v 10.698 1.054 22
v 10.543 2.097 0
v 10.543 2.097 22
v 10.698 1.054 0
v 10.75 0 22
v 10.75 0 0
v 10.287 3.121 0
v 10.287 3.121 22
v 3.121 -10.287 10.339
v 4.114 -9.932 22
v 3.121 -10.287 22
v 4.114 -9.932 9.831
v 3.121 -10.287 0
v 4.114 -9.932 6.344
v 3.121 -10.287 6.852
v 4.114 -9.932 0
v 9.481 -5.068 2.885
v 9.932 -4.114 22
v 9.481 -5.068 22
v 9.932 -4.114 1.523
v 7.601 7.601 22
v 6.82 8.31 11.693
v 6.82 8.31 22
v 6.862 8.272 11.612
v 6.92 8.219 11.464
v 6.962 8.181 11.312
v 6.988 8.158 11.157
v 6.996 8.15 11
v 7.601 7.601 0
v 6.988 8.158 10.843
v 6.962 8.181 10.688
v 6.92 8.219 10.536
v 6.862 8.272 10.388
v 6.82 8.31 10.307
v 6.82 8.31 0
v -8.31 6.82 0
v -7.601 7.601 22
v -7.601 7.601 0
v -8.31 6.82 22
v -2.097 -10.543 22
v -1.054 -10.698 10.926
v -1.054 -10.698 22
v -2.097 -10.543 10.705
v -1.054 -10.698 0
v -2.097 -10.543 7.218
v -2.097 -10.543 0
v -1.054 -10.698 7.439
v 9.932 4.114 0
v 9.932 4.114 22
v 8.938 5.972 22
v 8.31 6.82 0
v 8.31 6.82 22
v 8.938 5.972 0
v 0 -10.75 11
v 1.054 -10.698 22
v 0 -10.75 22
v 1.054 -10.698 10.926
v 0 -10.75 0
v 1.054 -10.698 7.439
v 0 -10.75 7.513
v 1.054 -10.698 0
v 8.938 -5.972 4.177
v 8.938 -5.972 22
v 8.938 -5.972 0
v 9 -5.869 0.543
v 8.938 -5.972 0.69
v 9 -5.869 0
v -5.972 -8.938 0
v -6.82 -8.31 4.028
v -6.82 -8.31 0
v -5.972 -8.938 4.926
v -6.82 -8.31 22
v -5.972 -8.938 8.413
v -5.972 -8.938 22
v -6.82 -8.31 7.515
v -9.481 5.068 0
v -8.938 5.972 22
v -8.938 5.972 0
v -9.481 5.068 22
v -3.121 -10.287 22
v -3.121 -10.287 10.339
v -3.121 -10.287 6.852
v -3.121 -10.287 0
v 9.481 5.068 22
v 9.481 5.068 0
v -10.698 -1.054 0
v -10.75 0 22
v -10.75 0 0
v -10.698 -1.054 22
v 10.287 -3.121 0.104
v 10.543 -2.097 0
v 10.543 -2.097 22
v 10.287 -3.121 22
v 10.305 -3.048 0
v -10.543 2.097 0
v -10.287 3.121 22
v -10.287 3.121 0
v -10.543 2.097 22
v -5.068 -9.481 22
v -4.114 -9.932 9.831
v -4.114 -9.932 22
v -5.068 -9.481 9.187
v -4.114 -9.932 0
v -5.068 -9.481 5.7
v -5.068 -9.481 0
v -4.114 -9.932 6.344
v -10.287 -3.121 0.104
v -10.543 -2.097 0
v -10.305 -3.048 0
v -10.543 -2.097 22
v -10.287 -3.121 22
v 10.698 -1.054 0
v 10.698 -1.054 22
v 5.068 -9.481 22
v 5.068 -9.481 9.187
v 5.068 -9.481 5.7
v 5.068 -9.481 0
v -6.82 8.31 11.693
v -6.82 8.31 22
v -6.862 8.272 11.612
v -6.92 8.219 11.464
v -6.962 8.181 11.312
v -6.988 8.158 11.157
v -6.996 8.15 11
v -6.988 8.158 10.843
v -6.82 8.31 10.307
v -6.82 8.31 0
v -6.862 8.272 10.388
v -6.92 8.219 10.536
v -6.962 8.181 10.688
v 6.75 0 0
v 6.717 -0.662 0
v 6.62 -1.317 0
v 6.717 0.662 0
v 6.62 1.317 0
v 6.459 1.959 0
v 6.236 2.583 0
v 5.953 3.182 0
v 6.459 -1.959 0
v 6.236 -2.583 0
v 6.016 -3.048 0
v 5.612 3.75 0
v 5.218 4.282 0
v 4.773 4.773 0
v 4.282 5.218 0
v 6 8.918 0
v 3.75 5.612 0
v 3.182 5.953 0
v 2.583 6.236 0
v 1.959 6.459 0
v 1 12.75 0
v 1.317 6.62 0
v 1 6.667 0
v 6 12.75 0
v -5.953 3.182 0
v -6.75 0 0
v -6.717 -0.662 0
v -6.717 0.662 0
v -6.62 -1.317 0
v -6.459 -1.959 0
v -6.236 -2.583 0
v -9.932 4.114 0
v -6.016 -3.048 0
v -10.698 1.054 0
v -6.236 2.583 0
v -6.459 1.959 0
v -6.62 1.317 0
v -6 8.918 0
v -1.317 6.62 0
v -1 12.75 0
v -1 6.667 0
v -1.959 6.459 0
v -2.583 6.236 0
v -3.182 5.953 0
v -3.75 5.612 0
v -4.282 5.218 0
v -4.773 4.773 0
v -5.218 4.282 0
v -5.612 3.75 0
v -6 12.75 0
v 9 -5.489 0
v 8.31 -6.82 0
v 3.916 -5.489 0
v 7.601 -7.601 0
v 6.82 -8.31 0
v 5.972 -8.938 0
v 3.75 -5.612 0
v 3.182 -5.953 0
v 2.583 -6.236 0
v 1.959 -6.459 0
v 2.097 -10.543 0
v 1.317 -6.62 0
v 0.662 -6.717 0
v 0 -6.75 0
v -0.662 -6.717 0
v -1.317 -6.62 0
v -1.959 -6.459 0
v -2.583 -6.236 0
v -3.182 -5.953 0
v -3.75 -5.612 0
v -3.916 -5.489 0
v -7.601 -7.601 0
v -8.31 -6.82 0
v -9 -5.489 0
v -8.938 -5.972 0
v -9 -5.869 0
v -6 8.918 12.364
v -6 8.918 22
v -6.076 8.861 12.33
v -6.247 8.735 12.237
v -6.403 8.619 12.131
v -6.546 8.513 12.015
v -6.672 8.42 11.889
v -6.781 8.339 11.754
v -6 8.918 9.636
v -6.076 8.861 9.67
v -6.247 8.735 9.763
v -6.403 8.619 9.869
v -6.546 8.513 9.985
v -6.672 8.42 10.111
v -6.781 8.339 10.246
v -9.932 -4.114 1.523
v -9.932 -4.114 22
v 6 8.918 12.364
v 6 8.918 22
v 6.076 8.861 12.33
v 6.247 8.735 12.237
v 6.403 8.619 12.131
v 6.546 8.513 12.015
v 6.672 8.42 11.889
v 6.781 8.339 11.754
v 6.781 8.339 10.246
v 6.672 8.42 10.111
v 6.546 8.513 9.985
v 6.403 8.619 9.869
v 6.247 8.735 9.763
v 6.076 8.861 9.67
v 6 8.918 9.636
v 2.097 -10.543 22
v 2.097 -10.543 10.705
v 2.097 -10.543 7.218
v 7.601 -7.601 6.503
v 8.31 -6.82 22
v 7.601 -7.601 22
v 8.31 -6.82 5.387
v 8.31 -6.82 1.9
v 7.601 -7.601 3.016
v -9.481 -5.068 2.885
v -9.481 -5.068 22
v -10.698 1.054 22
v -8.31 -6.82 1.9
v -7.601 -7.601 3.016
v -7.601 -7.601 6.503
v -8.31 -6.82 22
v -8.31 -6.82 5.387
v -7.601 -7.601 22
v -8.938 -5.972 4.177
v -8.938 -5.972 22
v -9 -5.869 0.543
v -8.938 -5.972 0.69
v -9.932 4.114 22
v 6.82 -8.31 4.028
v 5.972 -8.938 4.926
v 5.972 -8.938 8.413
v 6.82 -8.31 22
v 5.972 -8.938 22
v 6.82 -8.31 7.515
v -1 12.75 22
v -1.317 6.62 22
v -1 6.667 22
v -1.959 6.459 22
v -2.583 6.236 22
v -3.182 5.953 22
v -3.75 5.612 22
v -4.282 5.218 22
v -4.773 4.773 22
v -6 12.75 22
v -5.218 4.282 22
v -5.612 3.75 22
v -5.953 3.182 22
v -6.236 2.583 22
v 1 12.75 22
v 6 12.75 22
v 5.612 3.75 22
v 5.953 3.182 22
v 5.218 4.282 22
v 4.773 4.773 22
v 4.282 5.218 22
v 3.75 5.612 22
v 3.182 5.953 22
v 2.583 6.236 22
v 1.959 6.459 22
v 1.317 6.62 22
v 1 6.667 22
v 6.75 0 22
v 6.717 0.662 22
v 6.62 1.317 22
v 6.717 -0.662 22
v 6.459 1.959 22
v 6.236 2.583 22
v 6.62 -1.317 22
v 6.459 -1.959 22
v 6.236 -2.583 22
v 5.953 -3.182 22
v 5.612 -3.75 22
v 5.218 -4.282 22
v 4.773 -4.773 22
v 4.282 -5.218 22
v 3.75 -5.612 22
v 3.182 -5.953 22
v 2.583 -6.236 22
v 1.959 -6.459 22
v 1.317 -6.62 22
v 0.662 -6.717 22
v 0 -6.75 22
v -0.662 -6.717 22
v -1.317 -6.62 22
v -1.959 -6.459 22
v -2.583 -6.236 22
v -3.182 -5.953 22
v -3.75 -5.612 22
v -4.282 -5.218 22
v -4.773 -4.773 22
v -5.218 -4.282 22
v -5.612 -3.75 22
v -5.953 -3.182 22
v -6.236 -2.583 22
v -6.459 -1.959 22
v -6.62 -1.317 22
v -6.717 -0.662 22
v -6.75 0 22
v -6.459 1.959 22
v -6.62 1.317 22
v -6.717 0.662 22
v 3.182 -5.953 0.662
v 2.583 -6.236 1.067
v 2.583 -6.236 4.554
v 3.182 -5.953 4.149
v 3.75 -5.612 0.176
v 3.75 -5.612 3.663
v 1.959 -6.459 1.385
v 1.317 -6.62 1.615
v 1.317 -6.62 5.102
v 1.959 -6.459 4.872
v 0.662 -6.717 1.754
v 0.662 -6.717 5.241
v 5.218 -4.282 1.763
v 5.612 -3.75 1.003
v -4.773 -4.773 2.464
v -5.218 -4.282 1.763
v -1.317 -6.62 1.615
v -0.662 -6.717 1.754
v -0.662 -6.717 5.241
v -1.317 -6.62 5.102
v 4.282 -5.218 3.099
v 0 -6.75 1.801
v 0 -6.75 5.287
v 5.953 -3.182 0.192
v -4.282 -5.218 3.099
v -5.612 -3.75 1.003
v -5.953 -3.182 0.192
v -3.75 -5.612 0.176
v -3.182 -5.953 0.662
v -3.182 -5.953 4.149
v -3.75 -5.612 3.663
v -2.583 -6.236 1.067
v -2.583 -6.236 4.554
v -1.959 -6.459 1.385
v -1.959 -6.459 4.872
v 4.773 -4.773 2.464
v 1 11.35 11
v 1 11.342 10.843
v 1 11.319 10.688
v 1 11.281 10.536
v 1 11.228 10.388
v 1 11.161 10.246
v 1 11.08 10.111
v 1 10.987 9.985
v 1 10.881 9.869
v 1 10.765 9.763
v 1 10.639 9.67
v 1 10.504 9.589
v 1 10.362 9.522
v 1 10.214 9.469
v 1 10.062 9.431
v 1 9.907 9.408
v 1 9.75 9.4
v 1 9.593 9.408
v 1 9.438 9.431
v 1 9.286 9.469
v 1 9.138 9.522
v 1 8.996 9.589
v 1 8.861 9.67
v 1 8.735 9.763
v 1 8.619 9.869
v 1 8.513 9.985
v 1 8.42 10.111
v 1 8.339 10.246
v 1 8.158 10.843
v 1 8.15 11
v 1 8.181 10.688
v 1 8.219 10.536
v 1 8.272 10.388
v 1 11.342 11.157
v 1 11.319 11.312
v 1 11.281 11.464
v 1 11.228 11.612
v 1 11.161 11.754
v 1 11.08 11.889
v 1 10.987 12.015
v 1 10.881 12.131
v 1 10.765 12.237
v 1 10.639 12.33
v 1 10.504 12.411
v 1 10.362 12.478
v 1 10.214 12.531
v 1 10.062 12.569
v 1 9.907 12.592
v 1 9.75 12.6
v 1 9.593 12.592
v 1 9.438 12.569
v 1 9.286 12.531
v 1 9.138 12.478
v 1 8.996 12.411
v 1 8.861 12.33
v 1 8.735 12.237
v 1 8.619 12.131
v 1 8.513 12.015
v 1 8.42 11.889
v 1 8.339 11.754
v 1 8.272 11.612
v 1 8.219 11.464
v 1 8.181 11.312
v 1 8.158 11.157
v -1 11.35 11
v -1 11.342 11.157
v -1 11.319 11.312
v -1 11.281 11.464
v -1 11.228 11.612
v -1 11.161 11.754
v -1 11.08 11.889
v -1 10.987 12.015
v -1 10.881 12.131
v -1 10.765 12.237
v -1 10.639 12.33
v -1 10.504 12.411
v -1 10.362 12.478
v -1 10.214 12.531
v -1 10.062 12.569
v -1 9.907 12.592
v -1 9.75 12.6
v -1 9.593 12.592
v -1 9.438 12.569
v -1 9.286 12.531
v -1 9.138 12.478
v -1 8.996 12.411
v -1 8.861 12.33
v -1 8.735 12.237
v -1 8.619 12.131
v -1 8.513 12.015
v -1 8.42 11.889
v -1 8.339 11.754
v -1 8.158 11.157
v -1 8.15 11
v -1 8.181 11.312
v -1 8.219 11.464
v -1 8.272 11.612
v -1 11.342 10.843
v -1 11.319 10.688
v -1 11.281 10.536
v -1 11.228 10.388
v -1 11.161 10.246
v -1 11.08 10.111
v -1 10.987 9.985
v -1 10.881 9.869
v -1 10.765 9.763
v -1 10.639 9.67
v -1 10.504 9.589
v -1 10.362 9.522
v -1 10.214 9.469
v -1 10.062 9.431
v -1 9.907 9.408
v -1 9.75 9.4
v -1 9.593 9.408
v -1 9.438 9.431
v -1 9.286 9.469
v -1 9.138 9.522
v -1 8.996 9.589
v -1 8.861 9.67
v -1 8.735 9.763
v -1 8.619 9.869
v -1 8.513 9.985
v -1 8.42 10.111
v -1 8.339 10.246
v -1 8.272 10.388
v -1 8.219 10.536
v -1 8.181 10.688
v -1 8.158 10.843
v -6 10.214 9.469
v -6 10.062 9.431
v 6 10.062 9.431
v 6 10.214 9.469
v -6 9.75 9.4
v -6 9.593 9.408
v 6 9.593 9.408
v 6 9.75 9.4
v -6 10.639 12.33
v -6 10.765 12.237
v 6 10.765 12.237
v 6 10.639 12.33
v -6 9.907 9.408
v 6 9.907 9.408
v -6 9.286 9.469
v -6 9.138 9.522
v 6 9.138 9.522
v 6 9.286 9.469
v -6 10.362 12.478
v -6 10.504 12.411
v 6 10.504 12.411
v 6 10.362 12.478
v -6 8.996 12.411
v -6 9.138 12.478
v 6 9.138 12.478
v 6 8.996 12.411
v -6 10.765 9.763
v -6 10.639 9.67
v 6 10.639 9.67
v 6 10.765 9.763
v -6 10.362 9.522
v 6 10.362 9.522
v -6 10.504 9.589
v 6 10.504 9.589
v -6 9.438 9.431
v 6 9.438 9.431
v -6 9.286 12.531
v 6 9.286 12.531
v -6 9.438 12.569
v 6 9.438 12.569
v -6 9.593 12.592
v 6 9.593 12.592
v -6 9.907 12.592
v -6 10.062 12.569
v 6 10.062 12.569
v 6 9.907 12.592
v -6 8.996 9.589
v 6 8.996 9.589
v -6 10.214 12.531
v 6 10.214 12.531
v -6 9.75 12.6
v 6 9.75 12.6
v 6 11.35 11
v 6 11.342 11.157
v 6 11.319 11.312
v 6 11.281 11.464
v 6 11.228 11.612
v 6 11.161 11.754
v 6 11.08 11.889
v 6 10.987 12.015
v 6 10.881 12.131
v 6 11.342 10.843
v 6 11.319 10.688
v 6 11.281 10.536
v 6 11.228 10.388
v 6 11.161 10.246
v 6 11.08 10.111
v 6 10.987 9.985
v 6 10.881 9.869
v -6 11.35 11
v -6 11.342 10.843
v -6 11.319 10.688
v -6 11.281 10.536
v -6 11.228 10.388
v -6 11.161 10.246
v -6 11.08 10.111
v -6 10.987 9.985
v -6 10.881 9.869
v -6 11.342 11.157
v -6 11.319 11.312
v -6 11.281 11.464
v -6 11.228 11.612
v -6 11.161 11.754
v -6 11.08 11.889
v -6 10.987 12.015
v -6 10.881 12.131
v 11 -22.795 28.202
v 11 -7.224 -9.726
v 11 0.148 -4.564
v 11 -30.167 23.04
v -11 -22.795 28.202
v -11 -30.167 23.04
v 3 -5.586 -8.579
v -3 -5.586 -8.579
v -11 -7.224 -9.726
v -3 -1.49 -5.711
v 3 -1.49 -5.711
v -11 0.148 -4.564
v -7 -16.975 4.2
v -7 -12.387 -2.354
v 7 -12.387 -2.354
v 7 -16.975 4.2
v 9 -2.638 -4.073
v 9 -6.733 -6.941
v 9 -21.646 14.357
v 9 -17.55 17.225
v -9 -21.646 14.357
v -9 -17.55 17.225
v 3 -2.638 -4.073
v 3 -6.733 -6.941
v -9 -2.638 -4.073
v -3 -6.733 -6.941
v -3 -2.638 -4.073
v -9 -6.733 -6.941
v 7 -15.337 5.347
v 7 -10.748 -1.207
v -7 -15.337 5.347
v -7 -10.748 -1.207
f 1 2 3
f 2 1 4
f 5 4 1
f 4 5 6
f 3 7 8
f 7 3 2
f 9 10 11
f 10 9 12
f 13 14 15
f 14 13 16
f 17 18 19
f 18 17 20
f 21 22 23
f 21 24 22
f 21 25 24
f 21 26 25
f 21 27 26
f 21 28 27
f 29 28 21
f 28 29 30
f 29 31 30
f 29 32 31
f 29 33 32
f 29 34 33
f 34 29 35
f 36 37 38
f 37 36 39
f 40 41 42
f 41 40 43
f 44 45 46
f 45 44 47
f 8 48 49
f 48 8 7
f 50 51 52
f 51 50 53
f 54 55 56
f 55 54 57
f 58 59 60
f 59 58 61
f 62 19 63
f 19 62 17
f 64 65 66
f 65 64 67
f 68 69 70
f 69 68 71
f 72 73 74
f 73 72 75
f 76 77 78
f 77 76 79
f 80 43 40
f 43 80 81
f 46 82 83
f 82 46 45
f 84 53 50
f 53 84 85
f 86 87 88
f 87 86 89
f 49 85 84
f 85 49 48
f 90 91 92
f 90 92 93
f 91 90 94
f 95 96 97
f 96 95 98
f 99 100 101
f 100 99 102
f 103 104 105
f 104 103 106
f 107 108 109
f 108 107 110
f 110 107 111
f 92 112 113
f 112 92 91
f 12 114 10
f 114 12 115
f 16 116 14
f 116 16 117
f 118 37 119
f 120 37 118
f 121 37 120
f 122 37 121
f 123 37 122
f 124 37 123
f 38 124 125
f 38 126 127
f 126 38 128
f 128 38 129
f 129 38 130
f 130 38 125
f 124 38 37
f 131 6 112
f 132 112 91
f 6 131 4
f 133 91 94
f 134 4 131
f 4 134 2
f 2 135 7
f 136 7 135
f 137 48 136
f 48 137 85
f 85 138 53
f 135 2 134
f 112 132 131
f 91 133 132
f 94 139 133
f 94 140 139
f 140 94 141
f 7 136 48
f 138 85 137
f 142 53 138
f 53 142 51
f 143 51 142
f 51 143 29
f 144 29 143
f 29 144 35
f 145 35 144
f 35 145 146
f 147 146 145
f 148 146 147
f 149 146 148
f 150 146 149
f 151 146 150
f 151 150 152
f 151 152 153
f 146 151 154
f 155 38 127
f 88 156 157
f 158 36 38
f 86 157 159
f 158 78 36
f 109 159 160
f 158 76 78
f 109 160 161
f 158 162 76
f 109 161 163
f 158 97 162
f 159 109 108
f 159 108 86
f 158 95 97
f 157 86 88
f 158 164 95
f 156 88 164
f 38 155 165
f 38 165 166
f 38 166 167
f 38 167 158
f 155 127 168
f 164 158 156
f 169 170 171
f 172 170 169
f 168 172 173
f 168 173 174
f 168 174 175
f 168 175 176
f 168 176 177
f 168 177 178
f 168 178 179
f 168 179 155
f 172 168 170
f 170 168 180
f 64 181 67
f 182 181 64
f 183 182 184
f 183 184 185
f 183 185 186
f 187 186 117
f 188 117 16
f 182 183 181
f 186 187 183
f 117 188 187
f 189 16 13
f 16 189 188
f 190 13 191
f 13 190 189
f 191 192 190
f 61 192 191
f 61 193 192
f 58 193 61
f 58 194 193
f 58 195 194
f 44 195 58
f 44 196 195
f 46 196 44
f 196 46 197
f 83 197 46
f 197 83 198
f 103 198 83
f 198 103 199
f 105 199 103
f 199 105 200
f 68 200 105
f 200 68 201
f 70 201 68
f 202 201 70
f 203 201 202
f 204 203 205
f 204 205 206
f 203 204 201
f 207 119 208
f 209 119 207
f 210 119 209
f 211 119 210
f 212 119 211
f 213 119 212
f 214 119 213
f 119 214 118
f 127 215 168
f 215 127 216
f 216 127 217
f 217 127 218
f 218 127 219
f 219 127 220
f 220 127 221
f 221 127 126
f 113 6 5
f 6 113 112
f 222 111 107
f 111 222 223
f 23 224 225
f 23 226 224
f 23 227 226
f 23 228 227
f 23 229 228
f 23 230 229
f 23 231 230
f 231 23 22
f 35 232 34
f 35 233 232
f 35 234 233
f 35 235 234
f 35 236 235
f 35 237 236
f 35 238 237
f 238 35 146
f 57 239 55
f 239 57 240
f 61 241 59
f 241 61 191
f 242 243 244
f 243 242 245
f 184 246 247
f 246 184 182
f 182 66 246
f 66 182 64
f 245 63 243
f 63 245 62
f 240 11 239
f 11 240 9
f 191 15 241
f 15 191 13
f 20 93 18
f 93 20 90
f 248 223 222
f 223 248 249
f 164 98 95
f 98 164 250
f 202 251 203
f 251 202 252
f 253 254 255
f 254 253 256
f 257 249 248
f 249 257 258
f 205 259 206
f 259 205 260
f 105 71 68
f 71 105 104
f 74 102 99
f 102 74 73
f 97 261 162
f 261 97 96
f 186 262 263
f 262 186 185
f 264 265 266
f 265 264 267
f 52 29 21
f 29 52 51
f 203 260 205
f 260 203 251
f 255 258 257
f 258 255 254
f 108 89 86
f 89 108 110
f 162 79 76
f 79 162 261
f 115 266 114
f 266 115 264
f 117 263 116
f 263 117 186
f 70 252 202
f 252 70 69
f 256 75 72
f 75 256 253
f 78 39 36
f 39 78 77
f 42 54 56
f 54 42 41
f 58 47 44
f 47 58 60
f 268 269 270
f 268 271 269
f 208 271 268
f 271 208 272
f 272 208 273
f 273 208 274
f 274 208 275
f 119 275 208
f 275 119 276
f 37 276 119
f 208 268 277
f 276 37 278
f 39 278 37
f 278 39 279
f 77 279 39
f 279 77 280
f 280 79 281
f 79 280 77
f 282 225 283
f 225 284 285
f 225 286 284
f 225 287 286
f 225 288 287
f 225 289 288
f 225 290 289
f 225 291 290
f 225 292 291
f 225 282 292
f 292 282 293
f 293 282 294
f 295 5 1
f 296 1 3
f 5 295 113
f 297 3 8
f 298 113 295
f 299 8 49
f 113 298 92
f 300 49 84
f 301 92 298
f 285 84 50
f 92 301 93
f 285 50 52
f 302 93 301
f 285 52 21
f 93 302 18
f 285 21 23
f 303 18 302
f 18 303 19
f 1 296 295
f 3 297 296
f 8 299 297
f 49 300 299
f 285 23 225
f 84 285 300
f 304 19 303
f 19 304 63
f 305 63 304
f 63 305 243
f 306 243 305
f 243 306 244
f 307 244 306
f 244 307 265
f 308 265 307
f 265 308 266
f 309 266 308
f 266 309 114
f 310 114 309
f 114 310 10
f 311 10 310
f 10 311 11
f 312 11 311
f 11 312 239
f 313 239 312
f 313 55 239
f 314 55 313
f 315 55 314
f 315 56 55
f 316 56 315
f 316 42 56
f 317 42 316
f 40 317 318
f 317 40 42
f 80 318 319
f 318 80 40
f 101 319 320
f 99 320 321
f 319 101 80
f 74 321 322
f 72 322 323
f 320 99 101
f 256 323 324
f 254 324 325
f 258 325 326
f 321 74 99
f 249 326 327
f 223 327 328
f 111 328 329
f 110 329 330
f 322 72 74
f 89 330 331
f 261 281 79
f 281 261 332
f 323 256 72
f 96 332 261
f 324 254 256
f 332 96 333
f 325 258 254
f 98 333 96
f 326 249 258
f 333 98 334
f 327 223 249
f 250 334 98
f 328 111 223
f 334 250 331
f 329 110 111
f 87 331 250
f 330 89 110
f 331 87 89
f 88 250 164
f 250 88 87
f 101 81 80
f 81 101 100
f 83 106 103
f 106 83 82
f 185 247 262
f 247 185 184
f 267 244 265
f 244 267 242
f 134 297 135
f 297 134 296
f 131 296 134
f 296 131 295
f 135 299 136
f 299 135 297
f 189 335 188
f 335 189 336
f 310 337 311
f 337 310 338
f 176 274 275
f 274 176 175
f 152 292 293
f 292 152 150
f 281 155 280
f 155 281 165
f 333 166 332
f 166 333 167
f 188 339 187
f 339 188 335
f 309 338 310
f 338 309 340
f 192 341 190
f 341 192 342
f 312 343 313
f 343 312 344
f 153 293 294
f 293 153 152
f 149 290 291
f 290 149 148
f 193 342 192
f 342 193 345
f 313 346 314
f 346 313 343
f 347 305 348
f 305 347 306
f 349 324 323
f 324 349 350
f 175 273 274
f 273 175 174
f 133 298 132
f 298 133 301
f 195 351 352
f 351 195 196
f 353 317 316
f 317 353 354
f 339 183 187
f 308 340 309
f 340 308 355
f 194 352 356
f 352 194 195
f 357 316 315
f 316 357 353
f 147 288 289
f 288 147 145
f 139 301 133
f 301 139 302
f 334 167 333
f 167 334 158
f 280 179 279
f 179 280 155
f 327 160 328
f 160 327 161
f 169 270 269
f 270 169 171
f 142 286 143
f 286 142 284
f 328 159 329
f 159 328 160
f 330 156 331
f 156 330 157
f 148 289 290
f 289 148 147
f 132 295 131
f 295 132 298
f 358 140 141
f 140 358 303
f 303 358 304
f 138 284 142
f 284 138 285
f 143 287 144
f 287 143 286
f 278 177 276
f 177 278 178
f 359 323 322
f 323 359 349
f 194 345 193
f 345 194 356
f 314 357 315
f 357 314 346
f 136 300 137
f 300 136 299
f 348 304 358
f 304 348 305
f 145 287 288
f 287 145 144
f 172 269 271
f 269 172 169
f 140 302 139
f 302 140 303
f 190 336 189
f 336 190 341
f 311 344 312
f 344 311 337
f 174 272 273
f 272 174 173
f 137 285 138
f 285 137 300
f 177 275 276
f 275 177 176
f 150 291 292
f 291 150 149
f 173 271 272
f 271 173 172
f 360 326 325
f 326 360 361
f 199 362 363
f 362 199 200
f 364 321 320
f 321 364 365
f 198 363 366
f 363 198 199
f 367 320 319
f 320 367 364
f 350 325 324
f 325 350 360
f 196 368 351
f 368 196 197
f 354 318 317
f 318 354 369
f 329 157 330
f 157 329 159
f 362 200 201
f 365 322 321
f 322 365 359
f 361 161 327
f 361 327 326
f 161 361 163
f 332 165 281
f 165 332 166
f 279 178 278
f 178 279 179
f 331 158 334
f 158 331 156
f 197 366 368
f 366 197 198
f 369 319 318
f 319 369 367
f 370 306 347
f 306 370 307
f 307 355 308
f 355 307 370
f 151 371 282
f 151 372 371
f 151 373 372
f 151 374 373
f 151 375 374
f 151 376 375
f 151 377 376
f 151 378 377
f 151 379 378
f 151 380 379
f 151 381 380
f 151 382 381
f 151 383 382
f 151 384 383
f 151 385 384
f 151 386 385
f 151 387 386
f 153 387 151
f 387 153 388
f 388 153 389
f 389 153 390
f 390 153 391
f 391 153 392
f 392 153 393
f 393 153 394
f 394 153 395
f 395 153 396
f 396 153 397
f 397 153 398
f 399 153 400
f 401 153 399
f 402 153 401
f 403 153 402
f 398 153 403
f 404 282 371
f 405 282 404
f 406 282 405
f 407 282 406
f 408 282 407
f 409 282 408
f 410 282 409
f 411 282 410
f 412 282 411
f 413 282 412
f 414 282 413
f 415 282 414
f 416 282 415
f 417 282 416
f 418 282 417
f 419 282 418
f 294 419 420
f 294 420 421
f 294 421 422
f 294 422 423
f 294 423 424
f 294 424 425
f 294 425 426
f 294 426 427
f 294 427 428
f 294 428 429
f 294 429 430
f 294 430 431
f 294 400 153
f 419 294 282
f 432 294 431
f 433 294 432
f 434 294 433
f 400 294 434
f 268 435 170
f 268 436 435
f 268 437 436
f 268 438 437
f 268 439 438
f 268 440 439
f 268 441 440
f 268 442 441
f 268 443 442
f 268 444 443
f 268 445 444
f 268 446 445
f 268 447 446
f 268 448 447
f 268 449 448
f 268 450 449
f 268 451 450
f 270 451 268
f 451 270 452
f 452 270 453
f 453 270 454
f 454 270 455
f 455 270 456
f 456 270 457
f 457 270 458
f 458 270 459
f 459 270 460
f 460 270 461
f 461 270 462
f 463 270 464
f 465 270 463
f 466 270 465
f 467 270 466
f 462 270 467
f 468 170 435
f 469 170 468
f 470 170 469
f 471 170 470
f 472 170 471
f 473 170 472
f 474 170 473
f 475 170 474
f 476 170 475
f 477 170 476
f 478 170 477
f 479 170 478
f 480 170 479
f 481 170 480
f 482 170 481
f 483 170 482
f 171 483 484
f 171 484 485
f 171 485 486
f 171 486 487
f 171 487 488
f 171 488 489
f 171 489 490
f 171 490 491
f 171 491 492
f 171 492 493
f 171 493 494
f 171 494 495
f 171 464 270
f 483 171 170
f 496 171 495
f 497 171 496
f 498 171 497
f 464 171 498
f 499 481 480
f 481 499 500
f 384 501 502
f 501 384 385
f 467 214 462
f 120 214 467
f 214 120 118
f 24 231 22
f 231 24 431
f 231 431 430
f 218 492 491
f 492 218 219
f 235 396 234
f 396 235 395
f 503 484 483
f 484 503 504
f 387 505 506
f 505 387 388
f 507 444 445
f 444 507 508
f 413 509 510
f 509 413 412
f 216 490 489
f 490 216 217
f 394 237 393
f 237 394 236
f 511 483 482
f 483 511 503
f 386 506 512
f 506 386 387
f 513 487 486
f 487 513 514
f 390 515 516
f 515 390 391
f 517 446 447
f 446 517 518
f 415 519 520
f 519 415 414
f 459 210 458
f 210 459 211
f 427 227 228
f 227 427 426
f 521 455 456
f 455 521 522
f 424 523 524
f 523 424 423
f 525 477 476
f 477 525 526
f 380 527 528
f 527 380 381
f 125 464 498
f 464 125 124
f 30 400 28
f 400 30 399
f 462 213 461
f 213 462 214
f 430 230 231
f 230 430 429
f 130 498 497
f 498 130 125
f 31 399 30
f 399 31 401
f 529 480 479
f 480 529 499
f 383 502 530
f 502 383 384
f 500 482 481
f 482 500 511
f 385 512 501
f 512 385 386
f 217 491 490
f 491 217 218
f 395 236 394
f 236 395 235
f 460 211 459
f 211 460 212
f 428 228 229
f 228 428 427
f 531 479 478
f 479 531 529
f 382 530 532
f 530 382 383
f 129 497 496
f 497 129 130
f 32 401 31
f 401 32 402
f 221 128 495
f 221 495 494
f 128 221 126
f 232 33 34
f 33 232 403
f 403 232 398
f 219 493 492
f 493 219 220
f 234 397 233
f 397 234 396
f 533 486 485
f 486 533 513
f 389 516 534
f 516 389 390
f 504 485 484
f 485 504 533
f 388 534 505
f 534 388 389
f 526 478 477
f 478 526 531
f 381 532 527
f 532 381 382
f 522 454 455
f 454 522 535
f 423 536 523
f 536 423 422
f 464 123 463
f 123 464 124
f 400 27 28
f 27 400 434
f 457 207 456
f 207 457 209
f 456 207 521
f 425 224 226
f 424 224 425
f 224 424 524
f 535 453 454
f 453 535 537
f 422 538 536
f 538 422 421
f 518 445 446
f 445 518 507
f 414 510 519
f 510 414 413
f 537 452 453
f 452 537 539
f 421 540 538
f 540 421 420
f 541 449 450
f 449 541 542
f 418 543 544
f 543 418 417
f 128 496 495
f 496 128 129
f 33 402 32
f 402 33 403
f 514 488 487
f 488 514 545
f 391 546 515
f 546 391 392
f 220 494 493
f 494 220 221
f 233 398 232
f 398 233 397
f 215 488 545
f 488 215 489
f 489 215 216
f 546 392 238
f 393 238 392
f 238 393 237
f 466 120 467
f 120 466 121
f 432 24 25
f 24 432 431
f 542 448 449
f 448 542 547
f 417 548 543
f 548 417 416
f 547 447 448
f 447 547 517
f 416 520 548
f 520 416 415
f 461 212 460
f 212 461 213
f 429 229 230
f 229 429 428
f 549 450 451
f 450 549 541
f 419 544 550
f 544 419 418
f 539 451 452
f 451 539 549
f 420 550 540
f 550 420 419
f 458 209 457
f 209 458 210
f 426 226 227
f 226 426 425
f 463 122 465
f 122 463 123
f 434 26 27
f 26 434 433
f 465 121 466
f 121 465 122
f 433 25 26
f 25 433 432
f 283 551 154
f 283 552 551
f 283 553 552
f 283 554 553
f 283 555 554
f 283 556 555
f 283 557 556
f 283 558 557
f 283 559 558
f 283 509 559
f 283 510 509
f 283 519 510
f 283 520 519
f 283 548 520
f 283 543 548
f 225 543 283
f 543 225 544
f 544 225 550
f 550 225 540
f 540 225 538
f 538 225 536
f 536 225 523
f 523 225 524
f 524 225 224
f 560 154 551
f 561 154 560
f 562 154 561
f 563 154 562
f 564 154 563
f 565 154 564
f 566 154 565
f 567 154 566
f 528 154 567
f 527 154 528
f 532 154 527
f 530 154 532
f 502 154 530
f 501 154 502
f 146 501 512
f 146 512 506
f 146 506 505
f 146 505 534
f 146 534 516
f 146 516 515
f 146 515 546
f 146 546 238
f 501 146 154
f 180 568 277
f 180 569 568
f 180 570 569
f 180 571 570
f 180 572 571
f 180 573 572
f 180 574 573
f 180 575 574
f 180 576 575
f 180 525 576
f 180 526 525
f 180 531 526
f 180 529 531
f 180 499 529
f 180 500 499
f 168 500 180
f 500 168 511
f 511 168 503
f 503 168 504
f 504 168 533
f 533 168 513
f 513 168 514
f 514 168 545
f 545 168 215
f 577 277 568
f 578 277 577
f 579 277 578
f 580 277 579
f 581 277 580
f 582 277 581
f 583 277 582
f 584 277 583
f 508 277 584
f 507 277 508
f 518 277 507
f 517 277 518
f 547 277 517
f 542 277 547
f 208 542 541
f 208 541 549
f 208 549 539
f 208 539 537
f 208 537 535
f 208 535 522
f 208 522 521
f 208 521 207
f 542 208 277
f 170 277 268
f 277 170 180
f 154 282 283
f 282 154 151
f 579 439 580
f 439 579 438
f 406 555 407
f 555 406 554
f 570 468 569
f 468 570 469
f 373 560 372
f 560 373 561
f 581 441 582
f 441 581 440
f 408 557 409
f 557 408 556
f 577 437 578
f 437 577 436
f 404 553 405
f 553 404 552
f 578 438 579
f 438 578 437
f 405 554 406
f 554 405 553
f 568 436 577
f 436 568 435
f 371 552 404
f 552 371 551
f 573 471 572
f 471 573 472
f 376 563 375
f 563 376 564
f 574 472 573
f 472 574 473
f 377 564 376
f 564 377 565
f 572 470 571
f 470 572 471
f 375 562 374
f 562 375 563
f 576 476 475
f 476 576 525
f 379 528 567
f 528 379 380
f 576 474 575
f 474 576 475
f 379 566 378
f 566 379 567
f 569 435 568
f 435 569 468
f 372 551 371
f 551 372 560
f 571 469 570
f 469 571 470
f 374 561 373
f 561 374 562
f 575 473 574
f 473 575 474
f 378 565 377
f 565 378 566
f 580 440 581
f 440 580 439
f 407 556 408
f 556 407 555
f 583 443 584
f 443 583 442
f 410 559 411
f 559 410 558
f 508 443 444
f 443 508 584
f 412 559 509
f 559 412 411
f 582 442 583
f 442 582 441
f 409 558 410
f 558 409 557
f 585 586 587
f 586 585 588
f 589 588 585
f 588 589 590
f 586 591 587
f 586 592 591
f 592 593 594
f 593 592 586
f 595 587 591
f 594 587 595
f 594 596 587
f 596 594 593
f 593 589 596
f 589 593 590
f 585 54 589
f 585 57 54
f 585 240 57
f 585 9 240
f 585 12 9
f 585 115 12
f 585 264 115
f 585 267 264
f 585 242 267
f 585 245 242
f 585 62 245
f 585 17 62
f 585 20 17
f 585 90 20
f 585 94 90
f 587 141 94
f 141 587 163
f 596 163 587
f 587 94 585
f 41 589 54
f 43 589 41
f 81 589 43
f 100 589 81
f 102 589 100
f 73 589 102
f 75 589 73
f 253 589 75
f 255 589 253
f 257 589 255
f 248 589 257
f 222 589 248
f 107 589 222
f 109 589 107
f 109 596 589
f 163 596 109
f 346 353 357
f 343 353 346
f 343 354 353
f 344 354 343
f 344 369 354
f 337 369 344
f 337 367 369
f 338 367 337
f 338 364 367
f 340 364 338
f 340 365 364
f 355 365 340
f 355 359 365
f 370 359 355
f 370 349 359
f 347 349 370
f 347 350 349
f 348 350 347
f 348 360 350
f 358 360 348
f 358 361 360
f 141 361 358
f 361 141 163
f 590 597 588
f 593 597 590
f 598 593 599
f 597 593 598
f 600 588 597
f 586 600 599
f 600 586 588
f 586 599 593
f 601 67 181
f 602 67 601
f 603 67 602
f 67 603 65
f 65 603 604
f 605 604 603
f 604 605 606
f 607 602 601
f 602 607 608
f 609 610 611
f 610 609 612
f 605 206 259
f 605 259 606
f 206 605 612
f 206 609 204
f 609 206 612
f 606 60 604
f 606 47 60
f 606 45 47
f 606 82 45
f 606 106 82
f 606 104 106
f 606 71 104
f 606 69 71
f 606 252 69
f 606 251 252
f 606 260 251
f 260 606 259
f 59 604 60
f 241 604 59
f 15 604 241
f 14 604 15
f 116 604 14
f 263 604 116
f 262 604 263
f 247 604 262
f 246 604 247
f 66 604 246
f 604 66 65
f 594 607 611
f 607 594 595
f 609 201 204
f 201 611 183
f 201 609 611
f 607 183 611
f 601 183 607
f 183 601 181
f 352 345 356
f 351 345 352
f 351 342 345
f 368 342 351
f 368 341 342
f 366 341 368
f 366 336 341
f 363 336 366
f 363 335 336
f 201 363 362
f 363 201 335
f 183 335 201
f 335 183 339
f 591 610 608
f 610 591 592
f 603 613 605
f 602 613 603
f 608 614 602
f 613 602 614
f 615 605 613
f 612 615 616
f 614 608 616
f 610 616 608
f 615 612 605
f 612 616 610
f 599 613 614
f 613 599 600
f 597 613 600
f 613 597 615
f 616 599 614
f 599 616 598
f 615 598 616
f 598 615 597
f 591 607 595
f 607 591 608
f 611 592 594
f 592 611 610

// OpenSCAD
// sensor_pod.scad — hooded tube clamp for a VL53L1X breakout (Adafruit 25.5 x 17.5 x 4.6 mm)
// Clamps a 12.7 mm cane shaft, aims the sensor down-forward at the ground ahead.
// DRAFT: unrendered. Verify the sensor pocket against your actual breakout.
// Print: PETG, hood opening up, may need supports under the hood lip.
// LEGACY (ESP32 era, cut 2026-09-10 when the app went phone-only): do not print for the demo.
// Sized for a 12.7 mm aluminium/graphite shaft; the prototype stick is 27.65 mm (measured
// 2026-09-12), so nothing here fits it. The live mount is hardware/mount_screwless/ (see
// cad/README.md and hardware/README.md). Not rendered by any script (scripts/build_stl.ps1 covers
// hardware/ only); no tests; no owner on the current team. Units: millimetres throughout.
// Why it existed: the VL53L1X ground-distance sensor for the grip firmware's local drop-off /
// step-up fail-safe (firmware/canekit_grip/tof.cpp; README says aim ~40-60 cm ahead of the tip).
// The phone-only app replaced it with LiDAR ground hazards (AGENTS.md, Step 11).

$fn = 64;
shaft_d = 12.7; clear = 0.4;
clamp_len = 22; clamp_wall = 4;
aim_deg = 35;                 // tilt down from the shaft axis
brd_l = 26; brd_w = 18; brd_t = 5;   // sensor board pocket (adds clearance)
hood_len = 10;                // lip over the ToF window to shed rain
bolt_d = 3.2;

// Split ring clamping the shaft (axis +Z), with a pinch-bolt ear on the +Y side.
module clamp_ring() {
    difference() {
        cylinder(d = shaft_d + 2*clear + 2*clamp_wall, h = clamp_len);
        translate([0,0,-1]) cylinder(d = shaft_d + 2*clear, h = clamp_len + 2);
        // split
        translate([-1, 0, -1]) cube([2, shaft_d, clamp_len + 2]);
        // pinch bolt
        translate([0, shaft_d/2 + clear + 3, clamp_len/2]) rotate([0, 90, 0]) cylinder(d = bolt_d, h = 30, center = true);
    }
    // bolt ears
    difference() {
        translate([-6, shaft_d/2 + clear, 0]) cube([12, 6, clamp_len]);
        translate([-1, shaft_d/2 - 1, -1]) cube([2, 10, clamp_len + 2]);
        translate([0, shaft_d/2 + clear + 3, clamp_len/2]) rotate([0, 90, 0]) cylinder(d = bolt_d, h = 30, center = true);
    }
}
// Open-fronted box for the breakout: board pocket, a window for the sensor, a cable slot at the
// bottom, and hood_len of wall beyond the board as the rain hood.
module sensor_box() {
    difference() {
        translate([-brd_w/2 - 2, -brd_t - 4, 0]) cube([brd_w + 4, brd_t + 4, brd_l + 4 + hood_len]);
        translate([-brd_w/2, -brd_t - 2, 2]) cube([brd_w, brd_t, brd_l]);         // board pocket
        translate([-brd_w/2 + 2, -brd_t - 5, brd_l/2 - 4]) cube([brd_w - 4, 4, 8]); // window
        translate([-3, -brd_t - 2, -1]) cube([6, brd_t, 4]);                          // cable slot
    }
}
clamp_ring();
translate([0, -(shaft_d/2 + clear + clamp_wall), clamp_len/2])
    rotate([aim_deg, 0, 0]) translate([0, 0, -brd_l/2 - 6]) sensor_box();
